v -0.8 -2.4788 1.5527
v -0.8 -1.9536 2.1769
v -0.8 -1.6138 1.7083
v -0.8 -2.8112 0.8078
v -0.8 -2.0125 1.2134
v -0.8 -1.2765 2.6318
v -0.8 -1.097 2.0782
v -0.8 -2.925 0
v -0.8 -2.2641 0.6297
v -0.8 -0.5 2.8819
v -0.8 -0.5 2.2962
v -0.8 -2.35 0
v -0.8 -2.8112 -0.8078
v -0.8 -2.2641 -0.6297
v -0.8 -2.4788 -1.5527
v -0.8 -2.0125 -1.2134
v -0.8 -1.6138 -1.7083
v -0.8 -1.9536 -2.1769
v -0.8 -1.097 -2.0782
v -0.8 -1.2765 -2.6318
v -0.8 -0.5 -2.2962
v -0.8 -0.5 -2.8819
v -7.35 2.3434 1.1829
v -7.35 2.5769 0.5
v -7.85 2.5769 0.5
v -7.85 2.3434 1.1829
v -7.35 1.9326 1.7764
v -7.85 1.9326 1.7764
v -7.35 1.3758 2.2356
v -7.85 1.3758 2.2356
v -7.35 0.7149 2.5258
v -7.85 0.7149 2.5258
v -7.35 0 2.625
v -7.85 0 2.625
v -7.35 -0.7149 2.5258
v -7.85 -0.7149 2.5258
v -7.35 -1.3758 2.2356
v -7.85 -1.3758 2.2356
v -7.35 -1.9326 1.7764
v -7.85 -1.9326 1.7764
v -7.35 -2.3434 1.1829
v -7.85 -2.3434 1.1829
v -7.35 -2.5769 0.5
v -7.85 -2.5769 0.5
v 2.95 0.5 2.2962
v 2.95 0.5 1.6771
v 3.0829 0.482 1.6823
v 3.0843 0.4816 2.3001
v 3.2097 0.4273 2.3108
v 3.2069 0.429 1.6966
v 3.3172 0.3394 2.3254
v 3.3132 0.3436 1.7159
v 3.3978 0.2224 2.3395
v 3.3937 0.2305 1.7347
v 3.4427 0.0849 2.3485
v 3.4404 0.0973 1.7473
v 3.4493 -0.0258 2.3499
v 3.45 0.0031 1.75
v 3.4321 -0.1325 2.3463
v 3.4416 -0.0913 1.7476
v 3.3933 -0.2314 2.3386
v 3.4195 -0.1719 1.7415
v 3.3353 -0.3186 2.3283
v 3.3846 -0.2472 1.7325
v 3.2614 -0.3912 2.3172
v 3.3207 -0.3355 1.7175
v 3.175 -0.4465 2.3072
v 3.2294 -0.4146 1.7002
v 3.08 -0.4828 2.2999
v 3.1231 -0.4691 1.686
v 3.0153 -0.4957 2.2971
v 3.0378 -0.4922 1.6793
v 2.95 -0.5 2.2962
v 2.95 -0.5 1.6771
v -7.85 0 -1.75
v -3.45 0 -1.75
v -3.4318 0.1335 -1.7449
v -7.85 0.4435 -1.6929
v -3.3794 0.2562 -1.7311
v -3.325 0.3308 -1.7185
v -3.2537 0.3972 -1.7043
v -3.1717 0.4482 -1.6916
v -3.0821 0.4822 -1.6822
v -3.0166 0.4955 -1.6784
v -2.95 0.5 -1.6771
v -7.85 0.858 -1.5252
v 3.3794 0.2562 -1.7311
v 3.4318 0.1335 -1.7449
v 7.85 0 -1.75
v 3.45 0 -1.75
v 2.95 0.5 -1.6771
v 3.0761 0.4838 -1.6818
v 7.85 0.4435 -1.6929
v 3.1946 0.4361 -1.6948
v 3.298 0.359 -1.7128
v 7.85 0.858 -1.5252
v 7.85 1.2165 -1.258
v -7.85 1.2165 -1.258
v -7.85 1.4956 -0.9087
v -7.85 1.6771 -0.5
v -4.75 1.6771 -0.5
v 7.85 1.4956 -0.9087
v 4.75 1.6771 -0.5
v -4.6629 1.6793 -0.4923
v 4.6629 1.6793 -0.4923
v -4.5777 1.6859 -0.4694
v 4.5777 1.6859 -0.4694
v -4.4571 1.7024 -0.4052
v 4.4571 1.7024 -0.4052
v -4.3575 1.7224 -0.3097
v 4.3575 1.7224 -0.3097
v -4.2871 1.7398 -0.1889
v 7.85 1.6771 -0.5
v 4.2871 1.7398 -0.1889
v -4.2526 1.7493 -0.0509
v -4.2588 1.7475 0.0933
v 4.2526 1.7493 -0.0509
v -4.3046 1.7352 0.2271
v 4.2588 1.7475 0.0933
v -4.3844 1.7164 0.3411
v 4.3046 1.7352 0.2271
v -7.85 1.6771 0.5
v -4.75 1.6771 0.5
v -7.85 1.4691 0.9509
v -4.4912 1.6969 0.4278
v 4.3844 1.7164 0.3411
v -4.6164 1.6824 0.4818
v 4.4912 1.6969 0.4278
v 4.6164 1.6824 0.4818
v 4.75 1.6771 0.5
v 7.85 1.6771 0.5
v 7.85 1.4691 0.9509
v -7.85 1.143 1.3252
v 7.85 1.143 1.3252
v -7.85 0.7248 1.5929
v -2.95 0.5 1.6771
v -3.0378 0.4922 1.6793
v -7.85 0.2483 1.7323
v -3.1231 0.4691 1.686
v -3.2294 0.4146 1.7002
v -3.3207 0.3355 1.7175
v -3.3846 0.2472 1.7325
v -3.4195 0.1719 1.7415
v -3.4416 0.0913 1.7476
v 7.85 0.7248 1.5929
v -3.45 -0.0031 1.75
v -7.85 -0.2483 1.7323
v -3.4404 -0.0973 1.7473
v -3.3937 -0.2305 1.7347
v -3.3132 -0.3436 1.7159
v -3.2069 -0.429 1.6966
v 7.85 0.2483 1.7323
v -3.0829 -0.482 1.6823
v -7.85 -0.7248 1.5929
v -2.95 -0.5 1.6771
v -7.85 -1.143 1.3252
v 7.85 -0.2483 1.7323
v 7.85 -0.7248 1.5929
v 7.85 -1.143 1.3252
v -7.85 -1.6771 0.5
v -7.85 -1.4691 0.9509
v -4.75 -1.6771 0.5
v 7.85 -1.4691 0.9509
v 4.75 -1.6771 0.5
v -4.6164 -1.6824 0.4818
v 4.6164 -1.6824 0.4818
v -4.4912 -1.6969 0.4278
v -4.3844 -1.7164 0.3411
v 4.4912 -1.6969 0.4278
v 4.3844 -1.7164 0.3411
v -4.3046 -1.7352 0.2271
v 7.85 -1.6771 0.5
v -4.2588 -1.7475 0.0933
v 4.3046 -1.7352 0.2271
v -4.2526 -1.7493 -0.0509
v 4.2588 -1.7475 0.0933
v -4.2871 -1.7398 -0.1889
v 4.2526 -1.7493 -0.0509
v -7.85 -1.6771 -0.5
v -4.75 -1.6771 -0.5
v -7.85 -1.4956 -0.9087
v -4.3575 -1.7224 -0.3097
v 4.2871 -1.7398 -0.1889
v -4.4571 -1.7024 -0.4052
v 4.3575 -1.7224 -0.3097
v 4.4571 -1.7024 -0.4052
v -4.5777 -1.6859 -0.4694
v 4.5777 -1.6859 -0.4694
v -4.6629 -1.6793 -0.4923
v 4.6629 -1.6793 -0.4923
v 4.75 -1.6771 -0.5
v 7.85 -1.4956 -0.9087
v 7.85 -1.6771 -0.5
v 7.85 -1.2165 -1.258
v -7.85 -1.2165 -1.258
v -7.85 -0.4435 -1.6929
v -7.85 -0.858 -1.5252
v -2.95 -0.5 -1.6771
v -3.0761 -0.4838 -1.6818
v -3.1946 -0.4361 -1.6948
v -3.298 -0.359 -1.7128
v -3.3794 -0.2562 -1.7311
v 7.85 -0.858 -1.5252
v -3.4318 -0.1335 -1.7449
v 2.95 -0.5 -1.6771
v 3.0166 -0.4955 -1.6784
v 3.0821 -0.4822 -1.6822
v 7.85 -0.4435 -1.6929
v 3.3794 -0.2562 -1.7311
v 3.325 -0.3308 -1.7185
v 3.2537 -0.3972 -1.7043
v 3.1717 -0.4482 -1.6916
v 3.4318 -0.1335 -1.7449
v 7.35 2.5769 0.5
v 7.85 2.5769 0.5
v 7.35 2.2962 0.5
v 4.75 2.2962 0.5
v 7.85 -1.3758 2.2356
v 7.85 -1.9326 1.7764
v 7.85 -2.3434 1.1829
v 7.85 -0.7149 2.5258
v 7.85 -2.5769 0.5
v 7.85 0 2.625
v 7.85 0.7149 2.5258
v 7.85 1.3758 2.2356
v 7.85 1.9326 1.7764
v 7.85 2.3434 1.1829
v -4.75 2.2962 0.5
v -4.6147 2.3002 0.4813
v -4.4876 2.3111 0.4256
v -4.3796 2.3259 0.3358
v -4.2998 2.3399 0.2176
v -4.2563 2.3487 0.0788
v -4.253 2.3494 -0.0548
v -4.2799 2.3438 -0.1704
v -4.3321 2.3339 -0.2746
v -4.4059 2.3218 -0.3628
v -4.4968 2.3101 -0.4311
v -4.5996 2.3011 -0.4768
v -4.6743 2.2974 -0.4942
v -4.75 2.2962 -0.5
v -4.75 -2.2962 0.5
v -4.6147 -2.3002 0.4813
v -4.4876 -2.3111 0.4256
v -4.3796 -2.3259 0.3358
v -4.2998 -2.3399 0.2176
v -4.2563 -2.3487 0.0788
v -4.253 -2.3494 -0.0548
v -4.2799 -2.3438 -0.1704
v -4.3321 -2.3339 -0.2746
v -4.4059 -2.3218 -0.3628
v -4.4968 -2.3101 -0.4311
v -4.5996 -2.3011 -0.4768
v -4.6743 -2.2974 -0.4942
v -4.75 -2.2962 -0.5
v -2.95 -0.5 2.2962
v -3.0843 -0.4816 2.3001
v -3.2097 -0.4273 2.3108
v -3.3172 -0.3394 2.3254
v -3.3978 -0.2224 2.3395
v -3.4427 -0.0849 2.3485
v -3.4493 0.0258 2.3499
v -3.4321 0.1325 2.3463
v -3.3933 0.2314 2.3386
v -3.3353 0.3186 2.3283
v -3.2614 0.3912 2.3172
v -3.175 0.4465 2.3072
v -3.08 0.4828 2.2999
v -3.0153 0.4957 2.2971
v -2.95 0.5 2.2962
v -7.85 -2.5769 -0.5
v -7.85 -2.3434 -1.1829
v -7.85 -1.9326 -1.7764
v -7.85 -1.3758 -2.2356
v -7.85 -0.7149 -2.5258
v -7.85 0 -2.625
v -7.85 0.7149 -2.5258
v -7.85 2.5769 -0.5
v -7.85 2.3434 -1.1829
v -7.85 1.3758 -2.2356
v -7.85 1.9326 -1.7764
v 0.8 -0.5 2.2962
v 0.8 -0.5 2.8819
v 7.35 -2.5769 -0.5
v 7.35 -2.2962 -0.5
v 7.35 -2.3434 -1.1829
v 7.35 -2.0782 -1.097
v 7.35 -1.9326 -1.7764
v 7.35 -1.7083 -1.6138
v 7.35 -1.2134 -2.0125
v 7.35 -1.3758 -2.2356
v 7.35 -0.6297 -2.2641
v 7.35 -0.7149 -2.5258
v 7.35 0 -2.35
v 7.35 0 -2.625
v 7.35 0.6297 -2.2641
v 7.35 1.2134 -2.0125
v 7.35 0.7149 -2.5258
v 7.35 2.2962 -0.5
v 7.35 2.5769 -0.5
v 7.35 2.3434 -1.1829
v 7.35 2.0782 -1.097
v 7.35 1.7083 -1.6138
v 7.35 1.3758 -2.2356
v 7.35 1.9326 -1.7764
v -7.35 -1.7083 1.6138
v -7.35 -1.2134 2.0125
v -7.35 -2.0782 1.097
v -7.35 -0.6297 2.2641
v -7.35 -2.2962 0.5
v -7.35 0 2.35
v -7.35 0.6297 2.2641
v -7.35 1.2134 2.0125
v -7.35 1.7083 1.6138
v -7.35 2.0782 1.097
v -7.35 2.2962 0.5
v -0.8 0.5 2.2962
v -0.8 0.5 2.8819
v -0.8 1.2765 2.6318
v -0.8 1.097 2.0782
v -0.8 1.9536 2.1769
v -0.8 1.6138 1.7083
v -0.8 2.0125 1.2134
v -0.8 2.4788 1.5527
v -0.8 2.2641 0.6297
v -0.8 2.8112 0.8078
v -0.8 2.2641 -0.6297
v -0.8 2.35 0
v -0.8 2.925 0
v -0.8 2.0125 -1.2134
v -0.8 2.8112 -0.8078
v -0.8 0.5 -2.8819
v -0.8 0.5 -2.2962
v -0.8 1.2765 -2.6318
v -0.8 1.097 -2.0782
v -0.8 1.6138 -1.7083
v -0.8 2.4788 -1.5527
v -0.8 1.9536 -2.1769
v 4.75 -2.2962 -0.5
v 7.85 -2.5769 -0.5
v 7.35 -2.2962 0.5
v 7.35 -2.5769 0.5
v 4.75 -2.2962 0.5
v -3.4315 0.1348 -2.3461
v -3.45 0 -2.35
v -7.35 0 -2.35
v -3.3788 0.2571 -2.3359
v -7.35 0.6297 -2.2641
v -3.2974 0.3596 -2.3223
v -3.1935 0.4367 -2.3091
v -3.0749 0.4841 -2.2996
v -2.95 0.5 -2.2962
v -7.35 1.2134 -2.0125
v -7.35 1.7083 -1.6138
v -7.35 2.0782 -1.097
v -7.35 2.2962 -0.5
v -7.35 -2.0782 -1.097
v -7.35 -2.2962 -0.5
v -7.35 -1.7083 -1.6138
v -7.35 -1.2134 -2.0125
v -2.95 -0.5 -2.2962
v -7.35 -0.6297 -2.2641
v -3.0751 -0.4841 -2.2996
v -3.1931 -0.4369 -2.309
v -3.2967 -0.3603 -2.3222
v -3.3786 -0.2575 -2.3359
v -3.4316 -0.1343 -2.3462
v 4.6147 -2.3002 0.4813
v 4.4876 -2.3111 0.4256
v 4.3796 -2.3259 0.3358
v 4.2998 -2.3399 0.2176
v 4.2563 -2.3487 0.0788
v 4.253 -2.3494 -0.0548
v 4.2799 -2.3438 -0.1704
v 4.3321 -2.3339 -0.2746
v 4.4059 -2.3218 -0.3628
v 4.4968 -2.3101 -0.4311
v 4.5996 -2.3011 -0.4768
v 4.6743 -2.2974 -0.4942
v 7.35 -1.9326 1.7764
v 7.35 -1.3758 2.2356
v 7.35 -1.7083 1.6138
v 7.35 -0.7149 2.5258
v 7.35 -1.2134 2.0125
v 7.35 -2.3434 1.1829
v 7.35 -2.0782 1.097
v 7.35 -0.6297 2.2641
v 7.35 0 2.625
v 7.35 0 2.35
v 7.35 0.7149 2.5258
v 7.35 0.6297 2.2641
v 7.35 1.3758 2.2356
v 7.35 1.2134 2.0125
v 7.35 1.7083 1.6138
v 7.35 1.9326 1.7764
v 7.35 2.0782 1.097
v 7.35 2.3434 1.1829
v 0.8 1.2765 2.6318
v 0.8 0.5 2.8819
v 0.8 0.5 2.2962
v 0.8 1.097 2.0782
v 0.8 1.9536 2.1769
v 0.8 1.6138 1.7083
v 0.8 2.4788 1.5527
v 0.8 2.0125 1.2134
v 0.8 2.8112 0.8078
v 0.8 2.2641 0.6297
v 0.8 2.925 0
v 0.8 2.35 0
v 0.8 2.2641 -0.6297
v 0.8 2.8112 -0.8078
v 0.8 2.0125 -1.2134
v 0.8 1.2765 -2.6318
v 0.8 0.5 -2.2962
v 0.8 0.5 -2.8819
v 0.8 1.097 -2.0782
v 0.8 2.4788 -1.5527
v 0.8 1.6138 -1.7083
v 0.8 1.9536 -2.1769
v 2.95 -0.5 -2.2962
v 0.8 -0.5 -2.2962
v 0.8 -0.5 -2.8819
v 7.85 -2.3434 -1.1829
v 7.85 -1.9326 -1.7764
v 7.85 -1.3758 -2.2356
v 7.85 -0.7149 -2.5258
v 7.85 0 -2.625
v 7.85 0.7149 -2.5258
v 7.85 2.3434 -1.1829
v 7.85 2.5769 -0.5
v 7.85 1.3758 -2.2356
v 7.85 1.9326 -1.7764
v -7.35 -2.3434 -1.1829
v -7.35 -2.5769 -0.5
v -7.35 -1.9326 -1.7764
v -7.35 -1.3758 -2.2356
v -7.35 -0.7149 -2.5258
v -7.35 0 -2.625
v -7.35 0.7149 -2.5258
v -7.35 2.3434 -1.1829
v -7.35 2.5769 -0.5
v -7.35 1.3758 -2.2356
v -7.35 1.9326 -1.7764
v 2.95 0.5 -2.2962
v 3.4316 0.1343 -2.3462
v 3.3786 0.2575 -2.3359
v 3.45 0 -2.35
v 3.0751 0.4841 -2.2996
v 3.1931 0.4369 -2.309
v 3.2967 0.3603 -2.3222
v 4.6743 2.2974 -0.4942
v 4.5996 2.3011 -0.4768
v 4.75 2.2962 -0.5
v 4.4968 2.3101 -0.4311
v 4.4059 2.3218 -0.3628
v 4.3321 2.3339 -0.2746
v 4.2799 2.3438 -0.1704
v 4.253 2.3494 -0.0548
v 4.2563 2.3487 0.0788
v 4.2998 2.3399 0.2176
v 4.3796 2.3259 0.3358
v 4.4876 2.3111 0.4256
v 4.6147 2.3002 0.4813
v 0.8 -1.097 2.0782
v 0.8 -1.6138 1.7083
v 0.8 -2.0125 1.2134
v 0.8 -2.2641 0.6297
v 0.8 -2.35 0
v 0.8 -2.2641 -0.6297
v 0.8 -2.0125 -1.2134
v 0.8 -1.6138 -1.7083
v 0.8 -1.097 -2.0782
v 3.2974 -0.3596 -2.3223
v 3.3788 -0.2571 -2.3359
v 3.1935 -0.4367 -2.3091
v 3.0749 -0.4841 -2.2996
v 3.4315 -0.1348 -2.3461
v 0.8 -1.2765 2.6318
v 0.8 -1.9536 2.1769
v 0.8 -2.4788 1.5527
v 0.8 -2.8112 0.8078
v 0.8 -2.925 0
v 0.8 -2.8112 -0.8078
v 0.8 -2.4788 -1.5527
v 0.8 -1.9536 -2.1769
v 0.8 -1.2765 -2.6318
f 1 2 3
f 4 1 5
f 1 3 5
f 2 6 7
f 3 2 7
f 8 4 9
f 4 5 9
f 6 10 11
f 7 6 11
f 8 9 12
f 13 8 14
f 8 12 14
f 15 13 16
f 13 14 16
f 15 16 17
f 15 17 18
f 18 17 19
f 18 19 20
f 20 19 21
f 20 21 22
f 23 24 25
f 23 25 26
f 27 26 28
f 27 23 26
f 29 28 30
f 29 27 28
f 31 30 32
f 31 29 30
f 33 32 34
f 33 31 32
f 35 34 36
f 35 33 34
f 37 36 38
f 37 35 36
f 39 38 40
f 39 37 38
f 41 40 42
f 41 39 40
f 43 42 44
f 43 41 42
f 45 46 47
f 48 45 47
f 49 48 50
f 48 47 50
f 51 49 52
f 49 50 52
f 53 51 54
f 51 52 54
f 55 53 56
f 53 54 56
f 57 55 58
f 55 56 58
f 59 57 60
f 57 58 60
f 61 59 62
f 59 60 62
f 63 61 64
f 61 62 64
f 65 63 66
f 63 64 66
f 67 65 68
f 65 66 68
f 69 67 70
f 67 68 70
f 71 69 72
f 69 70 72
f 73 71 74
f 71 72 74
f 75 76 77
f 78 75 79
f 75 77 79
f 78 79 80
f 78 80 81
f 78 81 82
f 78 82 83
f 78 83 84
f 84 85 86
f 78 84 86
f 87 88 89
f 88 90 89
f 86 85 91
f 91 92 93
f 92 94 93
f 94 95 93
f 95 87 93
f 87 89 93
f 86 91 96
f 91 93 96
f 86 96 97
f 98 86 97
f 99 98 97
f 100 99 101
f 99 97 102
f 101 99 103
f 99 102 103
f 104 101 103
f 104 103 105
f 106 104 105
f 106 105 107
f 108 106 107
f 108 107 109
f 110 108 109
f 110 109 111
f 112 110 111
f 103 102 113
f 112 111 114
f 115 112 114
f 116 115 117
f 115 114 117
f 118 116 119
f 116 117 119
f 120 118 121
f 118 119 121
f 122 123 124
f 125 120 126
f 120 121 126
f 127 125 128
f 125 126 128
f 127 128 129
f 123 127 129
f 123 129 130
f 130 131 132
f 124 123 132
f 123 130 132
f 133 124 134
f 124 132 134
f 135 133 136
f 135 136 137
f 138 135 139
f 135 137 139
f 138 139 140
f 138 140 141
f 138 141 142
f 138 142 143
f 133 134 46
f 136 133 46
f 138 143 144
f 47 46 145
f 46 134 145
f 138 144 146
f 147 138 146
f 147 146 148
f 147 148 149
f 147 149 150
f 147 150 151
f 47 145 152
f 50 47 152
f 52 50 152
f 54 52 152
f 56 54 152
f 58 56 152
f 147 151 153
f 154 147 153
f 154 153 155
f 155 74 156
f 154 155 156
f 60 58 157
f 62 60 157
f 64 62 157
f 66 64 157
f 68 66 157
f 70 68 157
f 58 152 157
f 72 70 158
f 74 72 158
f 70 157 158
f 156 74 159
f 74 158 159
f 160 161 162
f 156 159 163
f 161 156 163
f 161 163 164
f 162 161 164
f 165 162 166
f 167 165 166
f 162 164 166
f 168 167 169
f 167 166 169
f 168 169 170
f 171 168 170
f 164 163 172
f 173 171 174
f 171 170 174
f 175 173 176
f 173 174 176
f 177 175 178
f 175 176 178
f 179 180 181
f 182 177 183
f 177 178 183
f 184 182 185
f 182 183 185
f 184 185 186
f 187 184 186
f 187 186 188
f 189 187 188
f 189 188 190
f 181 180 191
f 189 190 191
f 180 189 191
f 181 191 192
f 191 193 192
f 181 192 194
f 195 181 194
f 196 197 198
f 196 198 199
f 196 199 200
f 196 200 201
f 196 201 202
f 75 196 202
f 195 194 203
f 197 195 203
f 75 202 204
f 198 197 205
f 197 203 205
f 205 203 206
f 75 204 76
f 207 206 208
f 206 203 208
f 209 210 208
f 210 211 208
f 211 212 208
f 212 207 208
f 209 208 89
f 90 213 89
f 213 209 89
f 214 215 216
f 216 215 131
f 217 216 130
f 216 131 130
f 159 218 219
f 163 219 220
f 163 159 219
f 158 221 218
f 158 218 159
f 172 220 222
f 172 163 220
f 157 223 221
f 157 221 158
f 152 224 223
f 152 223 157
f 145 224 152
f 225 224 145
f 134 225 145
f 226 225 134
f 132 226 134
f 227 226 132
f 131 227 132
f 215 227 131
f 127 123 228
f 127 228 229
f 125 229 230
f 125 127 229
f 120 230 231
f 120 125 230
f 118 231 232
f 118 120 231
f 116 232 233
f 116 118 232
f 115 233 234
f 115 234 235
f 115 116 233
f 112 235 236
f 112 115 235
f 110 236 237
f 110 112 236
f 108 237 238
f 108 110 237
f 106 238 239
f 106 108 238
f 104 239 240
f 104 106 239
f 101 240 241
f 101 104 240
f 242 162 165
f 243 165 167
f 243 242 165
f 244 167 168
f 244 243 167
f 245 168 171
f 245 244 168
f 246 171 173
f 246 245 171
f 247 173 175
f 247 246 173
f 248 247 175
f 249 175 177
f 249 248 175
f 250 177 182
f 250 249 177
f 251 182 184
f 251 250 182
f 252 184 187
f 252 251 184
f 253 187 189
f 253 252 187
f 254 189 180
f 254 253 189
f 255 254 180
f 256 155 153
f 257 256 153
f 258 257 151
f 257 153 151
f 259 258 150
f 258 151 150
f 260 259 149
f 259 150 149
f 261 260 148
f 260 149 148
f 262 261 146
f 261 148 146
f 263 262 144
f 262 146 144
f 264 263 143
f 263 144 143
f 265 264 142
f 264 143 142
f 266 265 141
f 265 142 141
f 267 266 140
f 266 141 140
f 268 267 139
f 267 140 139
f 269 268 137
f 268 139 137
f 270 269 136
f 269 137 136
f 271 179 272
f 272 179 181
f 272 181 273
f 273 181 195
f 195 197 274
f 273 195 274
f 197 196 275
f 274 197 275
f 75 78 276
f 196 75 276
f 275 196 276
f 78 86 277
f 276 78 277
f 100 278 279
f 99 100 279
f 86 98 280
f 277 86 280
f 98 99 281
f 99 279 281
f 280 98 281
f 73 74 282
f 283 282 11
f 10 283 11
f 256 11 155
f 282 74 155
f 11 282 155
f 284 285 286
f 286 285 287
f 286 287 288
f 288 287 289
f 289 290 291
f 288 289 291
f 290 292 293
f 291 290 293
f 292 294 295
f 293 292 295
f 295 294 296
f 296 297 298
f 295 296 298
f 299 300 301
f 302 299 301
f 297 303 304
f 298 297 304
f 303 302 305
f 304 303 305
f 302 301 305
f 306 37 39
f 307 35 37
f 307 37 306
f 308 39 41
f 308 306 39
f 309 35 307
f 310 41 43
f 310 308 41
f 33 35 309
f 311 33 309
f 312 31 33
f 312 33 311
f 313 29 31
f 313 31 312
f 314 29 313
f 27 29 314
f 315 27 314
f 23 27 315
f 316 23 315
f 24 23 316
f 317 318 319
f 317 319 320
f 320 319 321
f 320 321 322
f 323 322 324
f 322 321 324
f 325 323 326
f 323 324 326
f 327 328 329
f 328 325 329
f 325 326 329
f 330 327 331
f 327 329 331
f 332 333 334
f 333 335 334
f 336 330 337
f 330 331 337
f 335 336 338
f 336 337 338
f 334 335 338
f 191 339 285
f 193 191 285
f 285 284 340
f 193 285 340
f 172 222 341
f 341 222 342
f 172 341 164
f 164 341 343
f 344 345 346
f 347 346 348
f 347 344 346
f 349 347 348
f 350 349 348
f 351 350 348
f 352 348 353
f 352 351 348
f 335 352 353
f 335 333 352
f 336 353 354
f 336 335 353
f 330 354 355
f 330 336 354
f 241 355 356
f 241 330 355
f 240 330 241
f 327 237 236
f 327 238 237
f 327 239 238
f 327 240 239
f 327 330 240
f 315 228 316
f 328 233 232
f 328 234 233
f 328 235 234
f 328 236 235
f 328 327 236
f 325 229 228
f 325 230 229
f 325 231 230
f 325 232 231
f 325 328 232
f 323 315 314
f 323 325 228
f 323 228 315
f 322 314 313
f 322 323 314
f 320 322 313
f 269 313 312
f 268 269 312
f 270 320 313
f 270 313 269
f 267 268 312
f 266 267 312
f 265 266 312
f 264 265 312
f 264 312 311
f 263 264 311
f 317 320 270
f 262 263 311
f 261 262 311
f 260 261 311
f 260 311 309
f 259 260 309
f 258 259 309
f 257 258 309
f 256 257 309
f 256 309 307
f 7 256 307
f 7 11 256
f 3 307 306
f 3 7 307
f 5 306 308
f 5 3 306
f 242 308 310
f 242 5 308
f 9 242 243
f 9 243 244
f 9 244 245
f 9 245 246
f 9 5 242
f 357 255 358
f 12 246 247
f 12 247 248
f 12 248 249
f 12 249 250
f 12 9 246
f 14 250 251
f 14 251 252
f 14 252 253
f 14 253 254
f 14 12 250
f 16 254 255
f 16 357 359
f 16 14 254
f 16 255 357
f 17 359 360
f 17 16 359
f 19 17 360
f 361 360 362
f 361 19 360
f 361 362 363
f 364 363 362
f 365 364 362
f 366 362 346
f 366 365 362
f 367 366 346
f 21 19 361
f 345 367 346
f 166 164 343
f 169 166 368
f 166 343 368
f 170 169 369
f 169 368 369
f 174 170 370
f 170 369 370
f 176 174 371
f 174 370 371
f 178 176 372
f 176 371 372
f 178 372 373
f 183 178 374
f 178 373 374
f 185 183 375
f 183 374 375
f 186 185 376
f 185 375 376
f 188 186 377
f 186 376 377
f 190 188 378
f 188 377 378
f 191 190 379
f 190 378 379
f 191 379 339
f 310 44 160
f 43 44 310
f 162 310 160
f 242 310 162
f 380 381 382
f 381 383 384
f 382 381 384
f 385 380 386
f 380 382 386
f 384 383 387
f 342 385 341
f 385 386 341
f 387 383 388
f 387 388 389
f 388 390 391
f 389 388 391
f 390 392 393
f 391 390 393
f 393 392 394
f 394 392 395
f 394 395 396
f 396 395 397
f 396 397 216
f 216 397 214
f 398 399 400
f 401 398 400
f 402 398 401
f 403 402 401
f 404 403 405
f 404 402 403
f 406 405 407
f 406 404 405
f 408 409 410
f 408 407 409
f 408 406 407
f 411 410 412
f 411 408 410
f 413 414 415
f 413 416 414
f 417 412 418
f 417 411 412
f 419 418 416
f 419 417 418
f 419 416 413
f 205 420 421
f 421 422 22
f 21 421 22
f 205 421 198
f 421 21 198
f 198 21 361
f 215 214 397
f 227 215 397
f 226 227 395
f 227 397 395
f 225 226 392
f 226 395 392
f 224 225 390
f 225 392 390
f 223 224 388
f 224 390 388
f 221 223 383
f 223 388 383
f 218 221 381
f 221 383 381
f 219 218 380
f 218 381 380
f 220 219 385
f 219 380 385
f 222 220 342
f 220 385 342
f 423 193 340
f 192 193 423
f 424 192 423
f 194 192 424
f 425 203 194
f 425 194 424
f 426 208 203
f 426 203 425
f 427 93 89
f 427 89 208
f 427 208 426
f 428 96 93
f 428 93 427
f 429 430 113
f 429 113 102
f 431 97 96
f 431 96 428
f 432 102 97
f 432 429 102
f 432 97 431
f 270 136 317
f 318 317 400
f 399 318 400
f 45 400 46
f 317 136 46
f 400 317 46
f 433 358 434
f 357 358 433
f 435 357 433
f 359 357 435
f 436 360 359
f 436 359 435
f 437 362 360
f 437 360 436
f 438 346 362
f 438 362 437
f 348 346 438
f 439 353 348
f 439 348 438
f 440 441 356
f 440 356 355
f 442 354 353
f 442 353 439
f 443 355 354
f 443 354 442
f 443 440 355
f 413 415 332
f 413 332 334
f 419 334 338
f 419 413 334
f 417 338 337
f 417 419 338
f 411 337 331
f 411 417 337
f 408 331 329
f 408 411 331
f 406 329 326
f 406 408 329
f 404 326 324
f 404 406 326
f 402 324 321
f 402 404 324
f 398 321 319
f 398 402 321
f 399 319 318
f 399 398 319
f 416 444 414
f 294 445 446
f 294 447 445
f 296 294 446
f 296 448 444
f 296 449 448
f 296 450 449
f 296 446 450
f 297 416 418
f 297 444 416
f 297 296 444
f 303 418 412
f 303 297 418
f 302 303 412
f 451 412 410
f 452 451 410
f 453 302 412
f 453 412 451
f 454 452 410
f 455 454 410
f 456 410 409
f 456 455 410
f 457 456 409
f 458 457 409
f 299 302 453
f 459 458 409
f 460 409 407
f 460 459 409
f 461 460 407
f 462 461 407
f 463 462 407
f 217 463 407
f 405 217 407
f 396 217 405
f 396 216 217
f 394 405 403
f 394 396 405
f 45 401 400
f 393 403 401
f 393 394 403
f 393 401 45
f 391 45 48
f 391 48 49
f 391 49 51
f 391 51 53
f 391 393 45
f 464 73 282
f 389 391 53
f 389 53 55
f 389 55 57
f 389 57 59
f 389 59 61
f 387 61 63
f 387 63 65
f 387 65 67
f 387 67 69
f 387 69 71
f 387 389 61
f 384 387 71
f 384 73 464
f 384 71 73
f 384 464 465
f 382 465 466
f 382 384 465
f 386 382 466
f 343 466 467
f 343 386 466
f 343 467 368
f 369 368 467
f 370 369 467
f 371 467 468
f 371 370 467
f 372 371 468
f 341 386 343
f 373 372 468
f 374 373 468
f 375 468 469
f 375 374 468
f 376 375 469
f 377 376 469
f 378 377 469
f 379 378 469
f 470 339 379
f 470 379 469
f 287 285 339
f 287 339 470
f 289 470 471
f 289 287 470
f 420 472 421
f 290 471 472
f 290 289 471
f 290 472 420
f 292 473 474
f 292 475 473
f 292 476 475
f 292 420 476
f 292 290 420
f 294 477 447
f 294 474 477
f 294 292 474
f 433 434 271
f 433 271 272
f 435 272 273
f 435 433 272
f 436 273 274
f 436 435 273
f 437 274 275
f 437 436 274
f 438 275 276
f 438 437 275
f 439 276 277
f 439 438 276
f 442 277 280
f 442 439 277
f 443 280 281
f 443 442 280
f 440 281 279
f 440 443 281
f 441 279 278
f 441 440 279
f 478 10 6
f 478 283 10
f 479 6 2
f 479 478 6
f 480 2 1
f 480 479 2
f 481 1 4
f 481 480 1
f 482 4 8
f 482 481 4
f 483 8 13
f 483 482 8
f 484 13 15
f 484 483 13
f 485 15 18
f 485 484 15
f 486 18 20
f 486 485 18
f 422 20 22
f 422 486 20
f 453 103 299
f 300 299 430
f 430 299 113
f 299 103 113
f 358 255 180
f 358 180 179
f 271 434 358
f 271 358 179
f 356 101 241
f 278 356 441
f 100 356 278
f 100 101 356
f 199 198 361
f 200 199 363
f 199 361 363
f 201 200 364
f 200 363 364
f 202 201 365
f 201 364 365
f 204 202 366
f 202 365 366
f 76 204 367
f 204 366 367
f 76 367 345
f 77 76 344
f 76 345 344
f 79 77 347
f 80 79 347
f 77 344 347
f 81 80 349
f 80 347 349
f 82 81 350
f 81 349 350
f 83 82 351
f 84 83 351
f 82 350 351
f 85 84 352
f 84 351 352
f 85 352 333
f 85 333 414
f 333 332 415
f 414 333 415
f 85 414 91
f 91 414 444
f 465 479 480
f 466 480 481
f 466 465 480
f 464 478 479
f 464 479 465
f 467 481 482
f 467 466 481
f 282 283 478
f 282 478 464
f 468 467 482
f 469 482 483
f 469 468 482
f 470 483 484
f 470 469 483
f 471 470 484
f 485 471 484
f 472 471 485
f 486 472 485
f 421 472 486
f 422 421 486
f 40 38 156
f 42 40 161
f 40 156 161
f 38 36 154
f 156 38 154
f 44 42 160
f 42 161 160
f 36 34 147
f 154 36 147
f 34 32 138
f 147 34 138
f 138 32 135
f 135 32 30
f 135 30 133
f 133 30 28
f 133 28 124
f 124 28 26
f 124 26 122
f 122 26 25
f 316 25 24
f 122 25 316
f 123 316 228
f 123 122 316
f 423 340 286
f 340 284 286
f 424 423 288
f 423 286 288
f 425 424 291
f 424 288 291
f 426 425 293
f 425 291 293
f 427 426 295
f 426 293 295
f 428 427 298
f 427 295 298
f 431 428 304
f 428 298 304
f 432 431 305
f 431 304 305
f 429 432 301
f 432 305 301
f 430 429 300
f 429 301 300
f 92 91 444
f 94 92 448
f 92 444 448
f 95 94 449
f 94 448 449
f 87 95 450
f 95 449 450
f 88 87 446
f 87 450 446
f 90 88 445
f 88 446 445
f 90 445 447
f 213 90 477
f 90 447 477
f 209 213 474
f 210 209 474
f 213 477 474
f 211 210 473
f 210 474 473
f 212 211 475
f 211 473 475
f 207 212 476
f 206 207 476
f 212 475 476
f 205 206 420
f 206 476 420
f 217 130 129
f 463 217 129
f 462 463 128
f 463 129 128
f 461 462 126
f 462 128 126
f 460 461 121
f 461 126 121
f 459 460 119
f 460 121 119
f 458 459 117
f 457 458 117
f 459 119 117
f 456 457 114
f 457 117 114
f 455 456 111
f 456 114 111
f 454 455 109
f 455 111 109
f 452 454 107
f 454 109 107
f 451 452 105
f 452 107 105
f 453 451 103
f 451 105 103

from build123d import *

# Parameters (mm, degrees)
SKETCH1_R              = 2.925
SKETCH1_R_2            = 1.75
MIDDLE_RING_DEPTH      = 0.8
SKETCH2_R              = 2.35
SKETCH2_R_2            = 1.75
OUTER_BODY_DEPTH       = 7.35
SKETCH3_R              = 2.625
SKETCH3_R_2            = 1.75
OUTER_RIM_DEPTH        = 0.5
MIDDLE_SLOT_DEPTH      = 9.873204044
MIDDLE_SLOT_DEPTH_BACK = 9.873204044
SIDE_SLOTS_DEPTH       = 9.859105574
SIDE_SLOTS_DEPTH_BACK  = 9.859105574


with BuildPart() as part:
    # Sketch1 → Middle Ring (new, symmetric)
    with BuildSketch(Plane(origin=(0, 0, 0), x_dir=(0, 0, -1), z_dir=(1, 0, 0))):
        Circle(SKETCH1_R)
        Circle(SKETCH1_R_2, mode=Mode.SUBTRACT)
    extrude(amount=MIDDLE_RING_DEPTH, both=True)

    # Sketch2 → Outer Body (add, symmetric)
    with BuildSketch(Plane(origin=(0, 0, 0), x_dir=(0, 0, -1), z_dir=(1, 0, 0))):
        Circle(SKETCH2_R)
        Circle(SKETCH2_R_2, mode=Mode.SUBTRACT)
    extrude(amount=OUTER_BODY_DEPTH, both=True)

    # Sketch3 → Outer Rim (add)
    with BuildSketch(Plane(origin=(7.35, 0, 0), x_dir=(0, 0, -1), z_dir=(1, 0, 0))):
        Circle(SKETCH3_R)
        Circle(SKETCH3_R_2, mode=Mode.SUBTRACT)
    outer_rim = extrude(amount=OUTER_RIM_DEPTH)

    # Mirror1: Outer Rim across plane
    add(outer_rim.mirror(Plane(origin=(0, 0, 0), x_dir=(0, 0, 1), z_dir=(1, 0, 0))))

    # Sketch4 → Middle Slot (cut, two sides: drawn at the far end of the back side and taken through both)
    with BuildSketch(Plane.XY.offset(-MIDDLE_SLOT_DEPTH_BACK)):
        with BuildLine():
            Line((2.95, -0.5), (-2.95, -0.5))
            ThreePointArc((-2.95, -0.5), (-3.45, 0), (-2.95, 0.5))
            Line((-2.95, 0.5), (2.95, 0.5))
            ThreePointArc((2.95, 0.5), (3.45, 0), (2.95, -0.5))
        make_face()
    extrude(amount=MIDDLE_SLOT_DEPTH + MIDDLE_SLOT_DEPTH_BACK, mode=Mode.SUBTRACT)

    # Sketch5 → Side Slots (cut, two sides: drawn at the far end of the back side and taken through both)
    with BuildSketch(Plane(origin=(0, 0, 0), x_dir=(1, 0, 0), z_dir=(0, 1, 0)).offset(-SIDE_SLOTS_DEPTH_BACK)):
        with BuildLine():
            Line((10.95, -0.5), (4.75, -0.5))
            ThreePointArc((4.75, -0.5), (4.25, 0), (4.75, 0.5))
            Line((4.75, 0.5), (10.95, 0.5))
            ThreePointArc((10.95, 0.5), (11.45, 0), (10.95, -0.5))
        make_face()
        with BuildLine():
            Line((-10.95, -0.5), (-4.75, -0.5))
            ThreePointArc((-4.75, -0.5), (-4.25, 0), (-4.75, 0.5))
            Line((-4.75, 0.5), (-10.95, 0.5))
            ThreePointArc((-10.95, 0.5), (-11.45, 0), (-10.95, -0.5))
        make_face()
    extrude(amount=SIDE_SLOTS_DEPTH + SIDE_SLOTS_DEPTH_BACK, mode=Mode.SUBTRACT)


solid = part.part
